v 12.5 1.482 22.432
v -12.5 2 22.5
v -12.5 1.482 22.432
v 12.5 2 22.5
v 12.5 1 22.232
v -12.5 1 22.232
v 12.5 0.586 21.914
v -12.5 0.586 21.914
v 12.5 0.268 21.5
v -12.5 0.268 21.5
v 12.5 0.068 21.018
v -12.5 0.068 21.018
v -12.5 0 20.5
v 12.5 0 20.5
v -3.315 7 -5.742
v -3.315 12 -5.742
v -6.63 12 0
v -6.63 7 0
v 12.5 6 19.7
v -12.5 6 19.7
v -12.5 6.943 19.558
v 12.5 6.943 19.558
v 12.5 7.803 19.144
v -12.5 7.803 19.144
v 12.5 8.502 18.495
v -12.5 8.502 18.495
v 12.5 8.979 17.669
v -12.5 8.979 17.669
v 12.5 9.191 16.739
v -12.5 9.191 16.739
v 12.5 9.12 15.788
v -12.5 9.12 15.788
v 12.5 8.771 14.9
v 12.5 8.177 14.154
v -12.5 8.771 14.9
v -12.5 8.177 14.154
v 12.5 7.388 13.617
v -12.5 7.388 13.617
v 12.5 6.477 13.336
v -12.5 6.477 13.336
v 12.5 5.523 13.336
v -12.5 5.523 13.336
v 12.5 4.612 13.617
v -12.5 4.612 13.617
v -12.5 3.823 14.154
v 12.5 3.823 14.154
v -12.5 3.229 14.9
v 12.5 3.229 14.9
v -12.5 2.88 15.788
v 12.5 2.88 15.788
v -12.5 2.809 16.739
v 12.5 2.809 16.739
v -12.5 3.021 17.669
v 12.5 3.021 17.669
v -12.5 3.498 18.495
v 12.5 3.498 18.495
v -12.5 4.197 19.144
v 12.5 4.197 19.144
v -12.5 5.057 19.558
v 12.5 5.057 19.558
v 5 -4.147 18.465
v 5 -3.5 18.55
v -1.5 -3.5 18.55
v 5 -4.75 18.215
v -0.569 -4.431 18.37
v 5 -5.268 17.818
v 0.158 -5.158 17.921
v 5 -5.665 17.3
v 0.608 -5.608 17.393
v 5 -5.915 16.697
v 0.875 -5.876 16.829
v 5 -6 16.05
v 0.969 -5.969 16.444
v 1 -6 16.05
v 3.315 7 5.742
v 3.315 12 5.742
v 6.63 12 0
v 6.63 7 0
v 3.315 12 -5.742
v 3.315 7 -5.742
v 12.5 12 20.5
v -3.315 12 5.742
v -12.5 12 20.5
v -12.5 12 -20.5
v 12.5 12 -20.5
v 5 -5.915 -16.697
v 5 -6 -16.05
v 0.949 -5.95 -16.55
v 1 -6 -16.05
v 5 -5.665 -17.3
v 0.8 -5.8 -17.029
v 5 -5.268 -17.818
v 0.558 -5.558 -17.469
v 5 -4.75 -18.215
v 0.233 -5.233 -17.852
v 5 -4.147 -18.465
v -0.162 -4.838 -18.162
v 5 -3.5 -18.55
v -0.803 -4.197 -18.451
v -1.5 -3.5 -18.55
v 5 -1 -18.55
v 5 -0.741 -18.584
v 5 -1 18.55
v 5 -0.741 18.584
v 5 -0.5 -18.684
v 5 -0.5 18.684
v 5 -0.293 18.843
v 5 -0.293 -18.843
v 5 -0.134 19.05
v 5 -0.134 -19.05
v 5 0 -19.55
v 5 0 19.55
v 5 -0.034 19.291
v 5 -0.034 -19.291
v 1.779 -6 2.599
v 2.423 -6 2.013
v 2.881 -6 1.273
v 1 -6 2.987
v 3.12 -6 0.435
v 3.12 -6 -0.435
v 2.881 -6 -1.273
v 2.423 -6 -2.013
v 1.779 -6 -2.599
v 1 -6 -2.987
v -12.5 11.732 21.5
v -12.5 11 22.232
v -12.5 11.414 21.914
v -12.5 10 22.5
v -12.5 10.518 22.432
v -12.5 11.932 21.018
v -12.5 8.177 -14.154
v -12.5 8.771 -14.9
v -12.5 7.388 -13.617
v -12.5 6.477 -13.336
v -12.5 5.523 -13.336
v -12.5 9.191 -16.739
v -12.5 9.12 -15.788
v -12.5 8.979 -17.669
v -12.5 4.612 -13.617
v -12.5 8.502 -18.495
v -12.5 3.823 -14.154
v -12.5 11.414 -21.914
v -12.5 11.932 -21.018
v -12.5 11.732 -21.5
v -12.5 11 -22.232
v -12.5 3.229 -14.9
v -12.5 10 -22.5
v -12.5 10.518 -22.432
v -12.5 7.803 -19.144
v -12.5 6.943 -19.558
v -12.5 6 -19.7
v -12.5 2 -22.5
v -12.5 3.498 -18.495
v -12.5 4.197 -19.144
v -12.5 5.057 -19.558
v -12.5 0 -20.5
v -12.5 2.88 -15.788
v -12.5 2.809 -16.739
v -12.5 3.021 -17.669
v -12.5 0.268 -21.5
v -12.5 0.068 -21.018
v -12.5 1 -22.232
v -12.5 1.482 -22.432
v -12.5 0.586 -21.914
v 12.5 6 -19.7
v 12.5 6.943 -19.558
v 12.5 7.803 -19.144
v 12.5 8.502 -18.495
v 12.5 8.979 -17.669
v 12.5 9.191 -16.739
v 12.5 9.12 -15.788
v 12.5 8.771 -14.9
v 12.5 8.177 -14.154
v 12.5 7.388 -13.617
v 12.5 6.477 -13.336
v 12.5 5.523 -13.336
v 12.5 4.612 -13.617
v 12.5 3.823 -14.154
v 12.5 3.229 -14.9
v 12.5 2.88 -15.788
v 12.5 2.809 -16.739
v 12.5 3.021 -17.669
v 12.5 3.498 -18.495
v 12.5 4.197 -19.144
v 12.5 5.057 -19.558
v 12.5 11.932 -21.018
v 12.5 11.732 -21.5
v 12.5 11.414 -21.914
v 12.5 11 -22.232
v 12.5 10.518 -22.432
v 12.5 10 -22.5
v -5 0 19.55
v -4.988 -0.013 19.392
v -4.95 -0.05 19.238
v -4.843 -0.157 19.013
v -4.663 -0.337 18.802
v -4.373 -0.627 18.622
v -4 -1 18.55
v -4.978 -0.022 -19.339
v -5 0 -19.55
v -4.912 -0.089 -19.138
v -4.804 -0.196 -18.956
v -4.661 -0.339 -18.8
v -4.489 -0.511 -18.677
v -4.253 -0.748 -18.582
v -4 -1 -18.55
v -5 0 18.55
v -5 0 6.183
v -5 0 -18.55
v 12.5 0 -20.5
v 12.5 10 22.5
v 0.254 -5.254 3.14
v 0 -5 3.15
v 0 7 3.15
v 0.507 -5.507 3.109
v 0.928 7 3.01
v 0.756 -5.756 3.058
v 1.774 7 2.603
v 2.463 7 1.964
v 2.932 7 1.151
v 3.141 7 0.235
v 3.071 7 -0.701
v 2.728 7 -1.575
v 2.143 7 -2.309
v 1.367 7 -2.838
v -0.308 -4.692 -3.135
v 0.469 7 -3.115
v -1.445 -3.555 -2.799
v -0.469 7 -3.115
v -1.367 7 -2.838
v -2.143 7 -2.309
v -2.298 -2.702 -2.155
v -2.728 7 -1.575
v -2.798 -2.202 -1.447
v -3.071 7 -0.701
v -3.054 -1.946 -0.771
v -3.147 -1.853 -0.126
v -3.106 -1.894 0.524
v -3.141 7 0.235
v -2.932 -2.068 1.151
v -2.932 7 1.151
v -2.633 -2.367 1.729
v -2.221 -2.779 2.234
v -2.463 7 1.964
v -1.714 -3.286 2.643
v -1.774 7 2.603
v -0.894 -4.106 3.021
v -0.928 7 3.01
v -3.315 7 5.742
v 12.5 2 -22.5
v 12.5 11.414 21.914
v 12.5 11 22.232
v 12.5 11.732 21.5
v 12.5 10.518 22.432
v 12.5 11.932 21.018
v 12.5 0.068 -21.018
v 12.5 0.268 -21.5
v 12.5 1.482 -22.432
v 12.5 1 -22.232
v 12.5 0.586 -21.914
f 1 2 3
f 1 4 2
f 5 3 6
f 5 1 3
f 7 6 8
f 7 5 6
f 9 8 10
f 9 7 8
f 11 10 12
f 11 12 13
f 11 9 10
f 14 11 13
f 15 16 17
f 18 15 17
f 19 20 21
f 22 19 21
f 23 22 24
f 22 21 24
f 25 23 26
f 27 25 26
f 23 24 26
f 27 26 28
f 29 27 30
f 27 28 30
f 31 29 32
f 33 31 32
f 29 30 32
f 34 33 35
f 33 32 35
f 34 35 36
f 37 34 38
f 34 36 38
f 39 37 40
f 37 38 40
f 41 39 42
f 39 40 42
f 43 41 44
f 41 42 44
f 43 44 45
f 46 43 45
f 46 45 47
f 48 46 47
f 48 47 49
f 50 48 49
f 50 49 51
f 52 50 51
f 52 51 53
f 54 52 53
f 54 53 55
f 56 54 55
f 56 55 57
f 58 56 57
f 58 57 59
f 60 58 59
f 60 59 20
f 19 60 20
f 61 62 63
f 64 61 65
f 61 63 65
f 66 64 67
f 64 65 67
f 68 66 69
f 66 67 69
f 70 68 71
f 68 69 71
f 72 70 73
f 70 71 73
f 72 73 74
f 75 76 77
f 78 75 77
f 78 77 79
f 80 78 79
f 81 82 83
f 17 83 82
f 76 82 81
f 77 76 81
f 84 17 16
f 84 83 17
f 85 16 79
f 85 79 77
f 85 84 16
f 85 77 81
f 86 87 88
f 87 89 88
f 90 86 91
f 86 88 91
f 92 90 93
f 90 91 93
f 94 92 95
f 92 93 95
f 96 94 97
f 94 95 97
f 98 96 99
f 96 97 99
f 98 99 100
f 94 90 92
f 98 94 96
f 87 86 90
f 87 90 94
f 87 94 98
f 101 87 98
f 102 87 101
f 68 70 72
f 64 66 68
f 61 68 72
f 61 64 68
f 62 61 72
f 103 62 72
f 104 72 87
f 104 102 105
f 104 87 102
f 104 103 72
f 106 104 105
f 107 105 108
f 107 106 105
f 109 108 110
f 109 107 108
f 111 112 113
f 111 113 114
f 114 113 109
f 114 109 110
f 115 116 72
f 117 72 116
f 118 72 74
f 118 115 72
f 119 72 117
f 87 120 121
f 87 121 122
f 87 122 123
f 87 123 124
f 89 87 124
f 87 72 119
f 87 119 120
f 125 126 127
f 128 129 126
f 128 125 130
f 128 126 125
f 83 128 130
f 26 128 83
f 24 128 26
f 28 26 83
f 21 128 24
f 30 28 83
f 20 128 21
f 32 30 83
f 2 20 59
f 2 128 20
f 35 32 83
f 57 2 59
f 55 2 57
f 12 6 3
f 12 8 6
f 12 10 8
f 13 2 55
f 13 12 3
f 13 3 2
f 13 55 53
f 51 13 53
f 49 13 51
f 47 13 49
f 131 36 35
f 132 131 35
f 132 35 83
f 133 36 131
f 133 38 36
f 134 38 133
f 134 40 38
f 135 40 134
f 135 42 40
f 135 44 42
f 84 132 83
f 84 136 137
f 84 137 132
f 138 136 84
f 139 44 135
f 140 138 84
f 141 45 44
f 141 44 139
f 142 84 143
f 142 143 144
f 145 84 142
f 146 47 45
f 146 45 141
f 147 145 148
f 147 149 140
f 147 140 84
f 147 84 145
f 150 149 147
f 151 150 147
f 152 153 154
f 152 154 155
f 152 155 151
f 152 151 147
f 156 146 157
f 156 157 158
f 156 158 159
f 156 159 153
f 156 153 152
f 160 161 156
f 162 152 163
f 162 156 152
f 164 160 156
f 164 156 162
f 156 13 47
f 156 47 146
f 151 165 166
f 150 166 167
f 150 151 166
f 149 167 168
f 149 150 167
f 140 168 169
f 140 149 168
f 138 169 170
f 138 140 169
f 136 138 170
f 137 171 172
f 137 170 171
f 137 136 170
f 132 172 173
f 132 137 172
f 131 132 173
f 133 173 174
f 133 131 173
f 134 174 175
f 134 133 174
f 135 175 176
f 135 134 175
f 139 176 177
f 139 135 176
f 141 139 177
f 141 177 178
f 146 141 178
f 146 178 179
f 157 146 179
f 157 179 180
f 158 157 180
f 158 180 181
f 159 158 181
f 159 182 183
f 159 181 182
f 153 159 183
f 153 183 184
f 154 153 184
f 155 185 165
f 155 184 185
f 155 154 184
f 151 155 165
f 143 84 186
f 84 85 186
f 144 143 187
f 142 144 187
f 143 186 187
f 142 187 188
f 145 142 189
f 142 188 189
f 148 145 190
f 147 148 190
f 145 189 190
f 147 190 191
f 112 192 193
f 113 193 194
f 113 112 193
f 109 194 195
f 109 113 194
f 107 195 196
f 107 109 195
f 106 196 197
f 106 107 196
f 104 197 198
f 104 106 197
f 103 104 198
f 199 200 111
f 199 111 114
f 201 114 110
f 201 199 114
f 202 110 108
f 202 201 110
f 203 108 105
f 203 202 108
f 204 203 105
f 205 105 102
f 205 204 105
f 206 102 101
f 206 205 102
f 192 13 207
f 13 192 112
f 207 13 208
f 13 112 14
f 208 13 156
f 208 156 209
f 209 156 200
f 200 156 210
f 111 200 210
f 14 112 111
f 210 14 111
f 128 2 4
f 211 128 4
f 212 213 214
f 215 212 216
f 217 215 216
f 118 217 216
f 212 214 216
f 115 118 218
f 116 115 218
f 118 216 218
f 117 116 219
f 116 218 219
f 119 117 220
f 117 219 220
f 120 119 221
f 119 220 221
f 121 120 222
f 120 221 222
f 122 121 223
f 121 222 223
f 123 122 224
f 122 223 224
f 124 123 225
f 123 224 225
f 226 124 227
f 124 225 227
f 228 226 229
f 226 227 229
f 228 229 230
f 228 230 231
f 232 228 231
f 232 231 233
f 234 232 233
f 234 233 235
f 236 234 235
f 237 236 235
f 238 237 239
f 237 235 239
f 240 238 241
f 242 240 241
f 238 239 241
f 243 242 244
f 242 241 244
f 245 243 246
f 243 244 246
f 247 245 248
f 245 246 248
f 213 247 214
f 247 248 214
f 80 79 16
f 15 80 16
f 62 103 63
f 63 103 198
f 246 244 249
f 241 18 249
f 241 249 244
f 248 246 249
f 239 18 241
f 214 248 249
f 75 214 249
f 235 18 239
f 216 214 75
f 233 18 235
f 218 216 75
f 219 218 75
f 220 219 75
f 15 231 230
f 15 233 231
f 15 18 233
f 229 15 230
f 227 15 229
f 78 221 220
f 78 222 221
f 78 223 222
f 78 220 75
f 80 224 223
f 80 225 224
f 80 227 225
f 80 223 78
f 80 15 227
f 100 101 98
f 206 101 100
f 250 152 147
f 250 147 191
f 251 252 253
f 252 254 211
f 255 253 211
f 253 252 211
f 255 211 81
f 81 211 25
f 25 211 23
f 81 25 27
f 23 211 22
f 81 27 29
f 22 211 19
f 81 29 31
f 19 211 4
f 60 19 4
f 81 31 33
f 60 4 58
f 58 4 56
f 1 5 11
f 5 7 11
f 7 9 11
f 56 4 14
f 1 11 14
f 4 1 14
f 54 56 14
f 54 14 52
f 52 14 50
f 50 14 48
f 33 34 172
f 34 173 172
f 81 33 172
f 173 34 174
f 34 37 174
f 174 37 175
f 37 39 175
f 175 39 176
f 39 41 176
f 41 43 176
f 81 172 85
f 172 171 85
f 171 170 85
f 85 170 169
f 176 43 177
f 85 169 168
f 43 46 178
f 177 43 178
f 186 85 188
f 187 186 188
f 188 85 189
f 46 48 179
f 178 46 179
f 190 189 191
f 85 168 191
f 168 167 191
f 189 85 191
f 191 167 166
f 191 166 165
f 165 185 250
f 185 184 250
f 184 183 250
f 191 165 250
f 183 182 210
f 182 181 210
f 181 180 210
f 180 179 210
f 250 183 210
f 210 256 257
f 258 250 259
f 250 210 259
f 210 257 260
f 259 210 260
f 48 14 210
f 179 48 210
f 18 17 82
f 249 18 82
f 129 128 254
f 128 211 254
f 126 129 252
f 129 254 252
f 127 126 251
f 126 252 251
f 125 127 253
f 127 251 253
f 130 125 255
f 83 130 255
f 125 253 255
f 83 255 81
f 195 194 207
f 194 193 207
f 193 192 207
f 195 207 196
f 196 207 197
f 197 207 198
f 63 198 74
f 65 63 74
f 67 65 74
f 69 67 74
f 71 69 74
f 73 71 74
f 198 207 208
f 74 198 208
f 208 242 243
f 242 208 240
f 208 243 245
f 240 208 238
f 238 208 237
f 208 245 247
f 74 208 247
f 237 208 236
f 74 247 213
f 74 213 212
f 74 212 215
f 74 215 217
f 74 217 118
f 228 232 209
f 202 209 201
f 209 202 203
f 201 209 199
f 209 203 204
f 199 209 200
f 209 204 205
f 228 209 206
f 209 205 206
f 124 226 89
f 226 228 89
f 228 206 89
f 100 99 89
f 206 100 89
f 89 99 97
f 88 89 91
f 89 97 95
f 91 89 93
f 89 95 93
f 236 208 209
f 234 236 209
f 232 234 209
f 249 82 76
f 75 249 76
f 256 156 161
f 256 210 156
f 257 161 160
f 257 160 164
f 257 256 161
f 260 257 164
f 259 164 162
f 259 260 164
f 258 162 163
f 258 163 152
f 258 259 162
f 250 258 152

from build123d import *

# Parameters (mm, degrees)
SKETCH1_W           = 25
SKETCH1_H           = 45
BOSS_EXTRUDE1_DEPTH = 12
CUT_EXTRUDE1_DEPTH  = 5
SKETCH3_R           = 3.15
CUT_EXTRUDE2_DEPTH  = 27.673957337
SKETCH8_R           = 3.2
CUT_EXTRUDE5_DEPTH  = 36.710642671
FILLET1_R           = 2
SKETCH10_W          = 10
SKETCH10_H          = 37.099879626
BOSS_EXTRUDE2_DEPTH = 6
CHAMFER1_SIZE       = 6
FILLET2_R           = 2.5
FILLET3_R           = 1
SKETCH12_R          = 3.15
CUT_EXTRUDE6_DEPTH  = 6


# Some blends are built 0.0001 mm under size
with BuildPart() as part:
    # Sketch1 → Boss-Extrude1 (new body)
    with BuildSketch(Plane(origin=(0, 0, 0), x_dir=(1, 0, 0), z_dir=(0, 1, 0))):
        Rectangle(SKETCH1_W, SKETCH1_H)
    extrude(amount=BOSS_EXTRUDE1_DEPTH)

    # Sketch2 → Cut-Extrude1 (cut)
    with BuildSketch(Plane(origin=(0, 12, 0), x_dir=(1, 0, 0), z_dir=(0, 1, 0))):
        Polygon((3.315, -5.741748427), (6.63, 0), (3.315, 5.741748427), (-3.315, 5.741748427), (-6.63, 0), (-3.315, -5.741748427), align=None)
    extrude(amount=-CUT_EXTRUDE1_DEPTH, mode=Mode.SUBTRACT)

    # Sketch3 → Cut-Extrude2 (cut, through all)
    with BuildSketch(Plane(origin=(0, 7, 0), x_dir=(1, 0, 0), z_dir=(0, 1, 0))):
        with Locations(Location((0, 0, 0), (0, 0, 270))):
            Circle(SKETCH3_R)
    extrude(amount=-CUT_EXTRUDE2_DEPTH, mode=Mode.SUBTRACT)

    # Sketch8 → Cut-Extrude5 (cut, through all)
    with BuildSketch(Plane.ZY.offset(12.5)):
        with Locations((16.5, 6)):
            Circle(SKETCH8_R)
    cut_extrude5 = extrude(amount=-CUT_EXTRUDE5_DEPTH, mode=Mode.SUBTRACT)

    # Mirror1: Cut-Extrude5 across plane
    add(cut_extrude5.mirror(Plane.XY), mode=Mode.SUBTRACT)

    # Fillet1
    fillet1_edges = [part.edges().sort_by_distance(p)[0] for p in [
        (0, 12, -22.5),
        (0, 0, -22.5),
        (0, 0, 22.5),
        (0, 12, 22.5),
    ]]
    fillet(fillet1_edges, radius=FILLET1_R)

    # Sketch10 → Boss-Extrude2 (add)
    with BuildSketch(Plane(origin=(0, 0, 0), x_dir=(-1, 0, 0), z_dir=(0, -1, 0))):
        Rectangle(SKETCH10_W, SKETCH10_H)
    extrude(amount=BOSS_EXTRUDE2_DEPTH)

    # Chamfer1
    chamfer1_edges = [part.edges().sort_by_distance(p)[0] for p in [
        (-5, -6, 0),
    ]]
    chamfer(chamfer1_edges, length=CHAMFER1_SIZE - 0.0001)  # a hair under: the kernel refuses the full size

    # Fillet2
    fillet2_edges = [part.edges().sort_by_distance(p)[0] for p in [
        (2.99995, -6, 18.549939813),
        (2.99995, -6, -18.549939813),
    ]]
    fillet(fillet2_edges, radius=FILLET2_R)

    # Fillet3
    # the kernel refuses this fillet: 1 mm, written as the material it adds along each edge
    with BuildSketch(Plane(origin=(-7.5, 0, -18.549939813), x_dir=(0, 0, -1), z_dir=(1, 0, 0))) as fillet3_piece_1_section:
        with BuildLine():
            CenterArc((FILLET3_R, -FILLET3_R), FILLET3_R, 90, 90)
            Line((0, -FILLET3_R), (0, 0))
            Line((0, 0), (FILLET3_R, 0))
        make_face()
    fillet3_piece_1 = extrude(amount=12.5, mode=Mode.PRIVATE)
    fillet3_piece_1 = split(fillet3_piece_1, bisect_by=Plane(origin=(-5.010050002, 0.009950002, -19.039939721), z_dir=(0.7071067811865476, 0.7071067811865476, 0)), keep=Keep.TOP, mode=Mode.PRIVATE)
    add(fillet3_piece_1)
    with BuildSketch(Plane(origin=(5, 0, 18.549939813), x_dir=(0, -1, 0), z_dir=(-1, 0, 0))) as fillet3_piece_2_section:
        with BuildLine():
            CenterArc((FILLET3_R, FILLET3_R), FILLET3_R, 180, 90)
            Line((0, FILLET3_R), (0, 0))
            Line((0, 0), (FILLET3_R, 0))
        make_face()
    fillet3_piece_2 = extrude(amount=12.5, mode=Mode.PRIVATE)
    fillet3_piece_2 = split(fillet3_piece_2, bisect_by=Plane(origin=(-2.333623853, -2.666476147, 18.779122608), z_dir=(0.7071067811865476, 0.7071067811865476, 0)), keep=Keep.TOP, mode=Mode.PRIVATE)
    add(fillet3_piece_2)

    # Sketch12 → Cut-Extrude6 (cut)
    with BuildSketch(Plane(origin=(0, 0, 0), x_dir=(1, 0, 0), z_dir=(0, 1, 0))):
        with Locations(Location((0, 0, 0), (0, 0, 270))):
            Circle(SKETCH12_R)
    extrude(amount=-CUT_EXTRUDE6_DEPTH, mode=Mode.SUBTRACT)


solid = part.part
